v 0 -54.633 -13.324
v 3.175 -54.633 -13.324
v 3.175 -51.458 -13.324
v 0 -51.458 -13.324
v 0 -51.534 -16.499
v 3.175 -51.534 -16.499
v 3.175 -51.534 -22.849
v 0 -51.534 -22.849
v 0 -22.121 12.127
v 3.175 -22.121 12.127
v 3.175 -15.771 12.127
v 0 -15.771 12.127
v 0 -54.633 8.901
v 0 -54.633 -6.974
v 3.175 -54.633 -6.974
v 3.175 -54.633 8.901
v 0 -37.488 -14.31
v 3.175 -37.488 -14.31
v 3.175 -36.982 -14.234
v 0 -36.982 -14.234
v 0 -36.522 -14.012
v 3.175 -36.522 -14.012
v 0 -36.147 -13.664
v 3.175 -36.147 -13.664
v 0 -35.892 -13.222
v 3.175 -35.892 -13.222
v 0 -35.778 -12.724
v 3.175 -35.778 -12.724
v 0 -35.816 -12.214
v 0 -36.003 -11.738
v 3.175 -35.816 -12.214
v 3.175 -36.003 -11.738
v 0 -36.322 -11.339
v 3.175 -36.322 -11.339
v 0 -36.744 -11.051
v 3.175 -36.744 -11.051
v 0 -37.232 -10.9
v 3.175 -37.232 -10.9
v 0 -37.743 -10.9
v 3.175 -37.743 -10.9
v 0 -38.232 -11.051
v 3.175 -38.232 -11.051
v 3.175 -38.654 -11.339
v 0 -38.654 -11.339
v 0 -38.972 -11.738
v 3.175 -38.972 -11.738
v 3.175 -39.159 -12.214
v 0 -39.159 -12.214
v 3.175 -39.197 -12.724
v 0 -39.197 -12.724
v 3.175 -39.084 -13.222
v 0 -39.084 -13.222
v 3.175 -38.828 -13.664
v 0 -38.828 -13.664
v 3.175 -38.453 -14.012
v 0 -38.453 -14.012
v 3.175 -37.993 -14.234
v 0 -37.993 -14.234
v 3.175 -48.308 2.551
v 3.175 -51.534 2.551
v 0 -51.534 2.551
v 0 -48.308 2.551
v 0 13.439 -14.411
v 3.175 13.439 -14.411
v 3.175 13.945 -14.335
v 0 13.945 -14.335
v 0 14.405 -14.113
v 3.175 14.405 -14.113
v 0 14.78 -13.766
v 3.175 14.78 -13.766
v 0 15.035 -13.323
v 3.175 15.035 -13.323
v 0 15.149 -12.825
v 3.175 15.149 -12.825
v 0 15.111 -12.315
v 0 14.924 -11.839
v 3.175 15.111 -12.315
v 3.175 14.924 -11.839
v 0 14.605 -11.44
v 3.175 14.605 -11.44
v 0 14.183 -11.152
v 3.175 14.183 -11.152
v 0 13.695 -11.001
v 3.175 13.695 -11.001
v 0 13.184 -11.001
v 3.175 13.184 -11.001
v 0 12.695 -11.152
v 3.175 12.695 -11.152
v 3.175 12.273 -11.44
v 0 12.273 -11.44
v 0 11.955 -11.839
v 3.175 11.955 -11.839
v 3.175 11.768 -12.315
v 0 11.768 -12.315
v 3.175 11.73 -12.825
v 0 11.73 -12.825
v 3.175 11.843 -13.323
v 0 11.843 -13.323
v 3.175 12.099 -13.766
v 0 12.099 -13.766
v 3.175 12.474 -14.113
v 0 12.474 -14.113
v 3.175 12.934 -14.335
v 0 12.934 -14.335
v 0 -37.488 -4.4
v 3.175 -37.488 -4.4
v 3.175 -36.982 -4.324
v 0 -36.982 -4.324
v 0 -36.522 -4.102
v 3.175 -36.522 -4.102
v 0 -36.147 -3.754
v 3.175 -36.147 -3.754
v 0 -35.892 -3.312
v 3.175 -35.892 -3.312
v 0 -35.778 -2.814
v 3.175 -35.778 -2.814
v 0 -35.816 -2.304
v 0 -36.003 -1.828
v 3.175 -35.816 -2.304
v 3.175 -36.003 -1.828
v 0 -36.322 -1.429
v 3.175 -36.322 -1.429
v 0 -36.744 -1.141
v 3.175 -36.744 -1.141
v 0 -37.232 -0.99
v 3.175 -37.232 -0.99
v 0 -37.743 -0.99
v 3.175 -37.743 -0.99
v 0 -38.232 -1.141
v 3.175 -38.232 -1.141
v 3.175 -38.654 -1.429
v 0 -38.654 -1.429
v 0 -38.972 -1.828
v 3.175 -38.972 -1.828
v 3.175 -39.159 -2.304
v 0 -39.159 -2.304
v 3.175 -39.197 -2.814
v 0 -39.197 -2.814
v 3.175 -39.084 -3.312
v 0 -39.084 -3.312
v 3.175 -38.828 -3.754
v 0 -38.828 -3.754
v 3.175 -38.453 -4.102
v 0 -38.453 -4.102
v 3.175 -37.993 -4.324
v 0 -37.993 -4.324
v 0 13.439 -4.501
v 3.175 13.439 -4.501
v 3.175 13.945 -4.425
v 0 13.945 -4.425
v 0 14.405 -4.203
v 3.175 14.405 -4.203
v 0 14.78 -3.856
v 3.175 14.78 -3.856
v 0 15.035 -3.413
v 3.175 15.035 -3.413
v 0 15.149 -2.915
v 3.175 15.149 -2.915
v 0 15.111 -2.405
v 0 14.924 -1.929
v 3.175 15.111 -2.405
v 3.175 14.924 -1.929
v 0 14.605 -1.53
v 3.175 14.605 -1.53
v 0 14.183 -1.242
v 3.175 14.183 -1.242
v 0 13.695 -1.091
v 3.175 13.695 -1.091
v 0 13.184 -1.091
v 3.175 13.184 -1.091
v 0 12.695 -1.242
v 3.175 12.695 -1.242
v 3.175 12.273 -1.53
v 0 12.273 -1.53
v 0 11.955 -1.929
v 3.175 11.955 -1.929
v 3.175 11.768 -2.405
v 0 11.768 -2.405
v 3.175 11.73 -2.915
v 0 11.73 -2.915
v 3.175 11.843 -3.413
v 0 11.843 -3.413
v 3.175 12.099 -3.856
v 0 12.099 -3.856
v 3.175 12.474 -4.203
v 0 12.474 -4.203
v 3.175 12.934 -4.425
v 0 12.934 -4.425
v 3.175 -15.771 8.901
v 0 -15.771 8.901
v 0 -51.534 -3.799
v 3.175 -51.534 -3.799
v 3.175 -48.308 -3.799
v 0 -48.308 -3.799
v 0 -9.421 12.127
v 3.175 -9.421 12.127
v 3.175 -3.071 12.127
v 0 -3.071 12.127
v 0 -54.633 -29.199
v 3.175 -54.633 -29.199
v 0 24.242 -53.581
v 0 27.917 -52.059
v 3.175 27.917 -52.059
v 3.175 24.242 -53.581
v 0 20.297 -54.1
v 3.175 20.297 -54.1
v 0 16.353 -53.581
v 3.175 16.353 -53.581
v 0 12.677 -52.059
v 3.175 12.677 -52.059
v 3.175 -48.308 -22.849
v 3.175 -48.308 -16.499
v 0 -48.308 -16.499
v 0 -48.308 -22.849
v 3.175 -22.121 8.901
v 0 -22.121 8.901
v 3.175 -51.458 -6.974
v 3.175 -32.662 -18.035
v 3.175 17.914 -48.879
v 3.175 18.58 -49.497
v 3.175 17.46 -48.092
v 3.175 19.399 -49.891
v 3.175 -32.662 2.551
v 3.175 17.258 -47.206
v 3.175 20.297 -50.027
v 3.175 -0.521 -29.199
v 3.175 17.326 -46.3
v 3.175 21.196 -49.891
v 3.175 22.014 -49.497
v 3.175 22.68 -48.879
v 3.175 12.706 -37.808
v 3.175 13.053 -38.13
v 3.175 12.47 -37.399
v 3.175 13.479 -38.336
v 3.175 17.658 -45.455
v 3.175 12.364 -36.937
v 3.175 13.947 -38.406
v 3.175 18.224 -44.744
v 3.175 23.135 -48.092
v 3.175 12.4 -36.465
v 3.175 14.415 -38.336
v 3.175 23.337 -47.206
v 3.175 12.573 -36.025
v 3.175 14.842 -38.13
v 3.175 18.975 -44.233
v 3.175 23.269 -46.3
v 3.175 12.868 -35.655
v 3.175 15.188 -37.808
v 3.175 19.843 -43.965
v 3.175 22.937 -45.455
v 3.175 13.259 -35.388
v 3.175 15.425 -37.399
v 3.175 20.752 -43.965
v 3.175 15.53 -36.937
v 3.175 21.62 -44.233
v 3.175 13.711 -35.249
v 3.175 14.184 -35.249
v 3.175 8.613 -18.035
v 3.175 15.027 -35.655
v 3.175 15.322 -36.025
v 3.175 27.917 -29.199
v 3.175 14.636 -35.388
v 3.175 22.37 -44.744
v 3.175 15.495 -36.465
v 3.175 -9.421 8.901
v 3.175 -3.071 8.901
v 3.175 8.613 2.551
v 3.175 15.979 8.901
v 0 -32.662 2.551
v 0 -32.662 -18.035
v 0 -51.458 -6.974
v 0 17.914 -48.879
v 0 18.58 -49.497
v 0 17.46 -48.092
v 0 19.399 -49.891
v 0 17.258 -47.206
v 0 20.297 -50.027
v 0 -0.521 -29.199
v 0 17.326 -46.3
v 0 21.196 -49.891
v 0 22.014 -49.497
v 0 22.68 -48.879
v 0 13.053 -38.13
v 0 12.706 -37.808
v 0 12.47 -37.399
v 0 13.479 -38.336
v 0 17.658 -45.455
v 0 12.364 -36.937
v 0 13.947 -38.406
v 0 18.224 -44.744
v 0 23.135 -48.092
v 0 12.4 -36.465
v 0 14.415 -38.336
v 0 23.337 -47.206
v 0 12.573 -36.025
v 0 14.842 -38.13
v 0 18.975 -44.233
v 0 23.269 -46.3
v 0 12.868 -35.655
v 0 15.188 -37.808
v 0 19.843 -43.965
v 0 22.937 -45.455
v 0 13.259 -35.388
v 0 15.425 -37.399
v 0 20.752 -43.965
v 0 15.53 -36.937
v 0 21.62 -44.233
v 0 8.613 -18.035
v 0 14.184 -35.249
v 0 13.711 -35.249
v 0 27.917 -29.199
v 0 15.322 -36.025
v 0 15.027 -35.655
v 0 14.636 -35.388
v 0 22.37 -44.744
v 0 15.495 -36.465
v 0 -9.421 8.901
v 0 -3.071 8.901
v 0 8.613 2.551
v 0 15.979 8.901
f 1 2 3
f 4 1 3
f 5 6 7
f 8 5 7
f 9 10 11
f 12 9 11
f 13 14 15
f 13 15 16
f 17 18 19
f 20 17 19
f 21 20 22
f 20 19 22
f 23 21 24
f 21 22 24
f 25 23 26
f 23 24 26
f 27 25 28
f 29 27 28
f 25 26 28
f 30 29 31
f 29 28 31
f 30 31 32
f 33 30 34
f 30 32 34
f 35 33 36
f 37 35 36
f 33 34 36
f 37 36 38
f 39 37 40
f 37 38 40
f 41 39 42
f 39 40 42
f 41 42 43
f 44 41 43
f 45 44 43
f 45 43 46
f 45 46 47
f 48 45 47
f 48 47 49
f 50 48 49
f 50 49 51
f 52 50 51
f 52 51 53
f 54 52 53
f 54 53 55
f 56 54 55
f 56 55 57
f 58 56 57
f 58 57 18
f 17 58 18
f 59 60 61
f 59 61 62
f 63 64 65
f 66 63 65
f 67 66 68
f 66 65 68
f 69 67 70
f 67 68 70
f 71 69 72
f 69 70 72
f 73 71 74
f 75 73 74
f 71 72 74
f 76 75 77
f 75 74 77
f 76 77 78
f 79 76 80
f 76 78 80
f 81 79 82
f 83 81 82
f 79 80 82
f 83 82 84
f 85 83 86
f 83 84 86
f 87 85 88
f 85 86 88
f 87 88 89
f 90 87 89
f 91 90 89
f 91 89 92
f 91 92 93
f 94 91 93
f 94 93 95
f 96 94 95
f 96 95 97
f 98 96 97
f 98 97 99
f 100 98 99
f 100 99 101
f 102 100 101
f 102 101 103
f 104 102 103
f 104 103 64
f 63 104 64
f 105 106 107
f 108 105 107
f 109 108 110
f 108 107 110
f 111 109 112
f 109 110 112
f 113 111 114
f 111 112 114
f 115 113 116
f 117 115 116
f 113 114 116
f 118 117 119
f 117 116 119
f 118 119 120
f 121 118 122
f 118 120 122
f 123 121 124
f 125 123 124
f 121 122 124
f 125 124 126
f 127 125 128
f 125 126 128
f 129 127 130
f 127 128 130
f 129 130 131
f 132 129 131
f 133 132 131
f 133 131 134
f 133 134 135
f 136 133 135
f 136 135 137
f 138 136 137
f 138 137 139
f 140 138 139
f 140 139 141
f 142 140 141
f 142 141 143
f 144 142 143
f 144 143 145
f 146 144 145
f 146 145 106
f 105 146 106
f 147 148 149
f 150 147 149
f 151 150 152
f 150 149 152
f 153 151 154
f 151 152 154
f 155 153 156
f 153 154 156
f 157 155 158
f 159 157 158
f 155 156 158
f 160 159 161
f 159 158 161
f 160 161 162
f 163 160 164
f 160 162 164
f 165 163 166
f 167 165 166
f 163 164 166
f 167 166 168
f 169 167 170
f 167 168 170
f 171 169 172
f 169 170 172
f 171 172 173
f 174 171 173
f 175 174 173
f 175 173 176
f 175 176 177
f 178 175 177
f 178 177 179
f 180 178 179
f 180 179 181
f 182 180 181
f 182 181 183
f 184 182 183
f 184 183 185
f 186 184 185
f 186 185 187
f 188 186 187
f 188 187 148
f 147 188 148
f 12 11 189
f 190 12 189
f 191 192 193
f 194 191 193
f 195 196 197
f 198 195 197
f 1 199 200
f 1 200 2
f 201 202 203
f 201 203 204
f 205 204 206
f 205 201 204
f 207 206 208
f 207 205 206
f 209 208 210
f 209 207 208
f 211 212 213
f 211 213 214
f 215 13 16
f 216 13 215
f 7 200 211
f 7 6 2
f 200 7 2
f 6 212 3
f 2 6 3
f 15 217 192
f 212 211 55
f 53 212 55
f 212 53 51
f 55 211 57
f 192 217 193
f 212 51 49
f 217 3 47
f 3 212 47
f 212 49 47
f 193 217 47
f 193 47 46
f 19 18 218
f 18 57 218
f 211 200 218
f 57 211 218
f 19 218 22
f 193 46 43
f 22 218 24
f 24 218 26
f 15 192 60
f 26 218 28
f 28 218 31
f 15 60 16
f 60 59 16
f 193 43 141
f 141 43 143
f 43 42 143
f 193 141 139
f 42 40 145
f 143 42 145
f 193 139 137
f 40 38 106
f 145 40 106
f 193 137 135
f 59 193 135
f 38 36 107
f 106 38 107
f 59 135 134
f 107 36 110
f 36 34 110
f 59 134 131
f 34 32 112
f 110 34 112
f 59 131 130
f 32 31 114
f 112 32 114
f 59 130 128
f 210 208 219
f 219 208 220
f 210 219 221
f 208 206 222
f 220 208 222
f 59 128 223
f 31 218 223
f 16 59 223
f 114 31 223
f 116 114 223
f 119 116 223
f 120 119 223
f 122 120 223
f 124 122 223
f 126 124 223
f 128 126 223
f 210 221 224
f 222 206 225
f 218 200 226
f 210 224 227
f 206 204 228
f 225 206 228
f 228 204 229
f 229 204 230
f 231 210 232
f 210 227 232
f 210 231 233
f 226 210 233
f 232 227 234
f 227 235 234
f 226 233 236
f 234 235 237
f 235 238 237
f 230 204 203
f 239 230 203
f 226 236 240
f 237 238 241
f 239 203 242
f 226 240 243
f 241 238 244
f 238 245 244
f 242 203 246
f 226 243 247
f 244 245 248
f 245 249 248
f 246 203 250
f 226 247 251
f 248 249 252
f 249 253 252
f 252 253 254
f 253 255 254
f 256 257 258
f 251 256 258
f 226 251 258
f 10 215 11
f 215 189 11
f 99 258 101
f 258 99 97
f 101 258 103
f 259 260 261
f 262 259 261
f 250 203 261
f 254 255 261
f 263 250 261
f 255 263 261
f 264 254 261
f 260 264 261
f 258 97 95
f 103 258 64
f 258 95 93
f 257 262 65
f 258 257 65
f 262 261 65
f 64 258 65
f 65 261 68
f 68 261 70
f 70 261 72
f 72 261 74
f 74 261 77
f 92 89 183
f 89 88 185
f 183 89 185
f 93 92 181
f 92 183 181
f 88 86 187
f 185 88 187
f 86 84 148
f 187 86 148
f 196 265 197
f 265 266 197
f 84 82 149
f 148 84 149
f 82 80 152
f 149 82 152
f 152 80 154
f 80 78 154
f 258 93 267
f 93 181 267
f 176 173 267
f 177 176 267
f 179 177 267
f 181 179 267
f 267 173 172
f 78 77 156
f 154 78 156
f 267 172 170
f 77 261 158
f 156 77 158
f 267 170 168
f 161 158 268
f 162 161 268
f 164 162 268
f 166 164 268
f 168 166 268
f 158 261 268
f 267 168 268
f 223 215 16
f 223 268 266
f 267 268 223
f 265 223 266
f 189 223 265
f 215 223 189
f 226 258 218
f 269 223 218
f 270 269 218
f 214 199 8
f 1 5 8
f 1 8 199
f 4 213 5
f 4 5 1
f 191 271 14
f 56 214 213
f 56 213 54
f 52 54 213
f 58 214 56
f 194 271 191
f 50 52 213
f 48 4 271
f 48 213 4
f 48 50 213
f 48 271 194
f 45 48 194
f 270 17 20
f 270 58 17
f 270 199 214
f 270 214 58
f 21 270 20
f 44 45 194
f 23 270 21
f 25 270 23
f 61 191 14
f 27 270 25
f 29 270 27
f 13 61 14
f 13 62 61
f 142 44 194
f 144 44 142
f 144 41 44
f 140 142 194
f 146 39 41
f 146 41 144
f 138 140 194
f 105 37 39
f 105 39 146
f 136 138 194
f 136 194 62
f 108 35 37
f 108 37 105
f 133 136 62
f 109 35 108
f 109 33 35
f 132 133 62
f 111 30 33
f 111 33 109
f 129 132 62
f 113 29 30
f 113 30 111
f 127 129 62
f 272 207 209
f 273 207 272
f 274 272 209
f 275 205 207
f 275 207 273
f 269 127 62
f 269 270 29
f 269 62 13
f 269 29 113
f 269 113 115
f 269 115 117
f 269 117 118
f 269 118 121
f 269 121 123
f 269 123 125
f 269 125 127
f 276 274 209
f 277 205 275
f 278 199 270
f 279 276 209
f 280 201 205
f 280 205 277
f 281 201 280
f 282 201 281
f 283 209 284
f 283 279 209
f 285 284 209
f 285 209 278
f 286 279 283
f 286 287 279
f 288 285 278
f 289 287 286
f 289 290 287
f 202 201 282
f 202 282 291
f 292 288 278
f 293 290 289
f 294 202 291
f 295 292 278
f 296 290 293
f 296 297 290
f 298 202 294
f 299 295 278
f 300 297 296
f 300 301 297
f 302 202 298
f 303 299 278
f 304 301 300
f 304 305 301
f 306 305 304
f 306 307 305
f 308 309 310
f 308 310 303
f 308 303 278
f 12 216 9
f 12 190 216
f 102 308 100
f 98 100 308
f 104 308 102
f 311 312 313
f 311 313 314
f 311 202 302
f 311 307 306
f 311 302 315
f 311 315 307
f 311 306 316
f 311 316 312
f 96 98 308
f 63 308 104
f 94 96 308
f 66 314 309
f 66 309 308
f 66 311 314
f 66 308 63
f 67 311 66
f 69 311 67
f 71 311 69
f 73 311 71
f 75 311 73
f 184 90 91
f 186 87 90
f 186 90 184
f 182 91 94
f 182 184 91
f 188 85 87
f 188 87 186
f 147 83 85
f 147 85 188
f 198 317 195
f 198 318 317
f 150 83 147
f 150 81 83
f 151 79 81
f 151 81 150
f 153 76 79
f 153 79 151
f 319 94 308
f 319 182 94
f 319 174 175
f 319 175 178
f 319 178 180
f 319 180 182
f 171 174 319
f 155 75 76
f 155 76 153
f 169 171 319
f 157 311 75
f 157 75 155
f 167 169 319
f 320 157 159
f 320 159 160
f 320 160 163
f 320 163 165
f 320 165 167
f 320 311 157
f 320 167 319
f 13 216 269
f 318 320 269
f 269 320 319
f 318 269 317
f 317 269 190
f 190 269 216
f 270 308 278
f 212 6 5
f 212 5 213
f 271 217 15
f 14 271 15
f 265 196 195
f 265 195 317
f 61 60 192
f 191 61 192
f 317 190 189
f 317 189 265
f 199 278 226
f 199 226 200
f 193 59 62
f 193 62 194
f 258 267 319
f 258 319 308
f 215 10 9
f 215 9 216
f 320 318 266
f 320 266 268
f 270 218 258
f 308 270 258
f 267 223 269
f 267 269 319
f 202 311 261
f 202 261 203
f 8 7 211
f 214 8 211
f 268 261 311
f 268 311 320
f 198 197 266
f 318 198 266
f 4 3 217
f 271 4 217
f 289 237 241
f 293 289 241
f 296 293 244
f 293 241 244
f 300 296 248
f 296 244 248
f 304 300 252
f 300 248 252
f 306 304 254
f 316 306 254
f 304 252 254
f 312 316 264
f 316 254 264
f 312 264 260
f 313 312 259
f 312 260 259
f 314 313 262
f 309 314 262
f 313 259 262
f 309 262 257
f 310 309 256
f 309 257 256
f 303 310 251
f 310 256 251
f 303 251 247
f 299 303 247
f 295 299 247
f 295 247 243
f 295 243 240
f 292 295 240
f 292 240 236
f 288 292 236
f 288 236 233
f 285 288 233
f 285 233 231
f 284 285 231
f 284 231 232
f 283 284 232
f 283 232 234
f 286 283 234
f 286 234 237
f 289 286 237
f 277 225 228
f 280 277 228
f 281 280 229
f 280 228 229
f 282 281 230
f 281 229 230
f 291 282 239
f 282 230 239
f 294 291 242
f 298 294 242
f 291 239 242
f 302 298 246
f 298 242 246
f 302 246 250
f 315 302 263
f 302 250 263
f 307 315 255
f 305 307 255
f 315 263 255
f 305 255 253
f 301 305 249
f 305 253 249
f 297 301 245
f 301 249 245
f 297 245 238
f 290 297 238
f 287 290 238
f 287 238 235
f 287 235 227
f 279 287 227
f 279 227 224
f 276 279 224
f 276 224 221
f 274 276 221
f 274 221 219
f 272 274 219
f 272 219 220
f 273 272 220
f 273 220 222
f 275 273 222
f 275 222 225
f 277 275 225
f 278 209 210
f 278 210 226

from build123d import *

# Parameters (mm, degrees)
BOSS_EXTRUDE1_DEPTH                 = 3.175
SKETCH2_R                           = 1.7145
SKETCH2_W                           = 20.586
SKETCH2_H                           = 41.275
CUT_FOR_MOTOR_DEPTH                 = 4.175
SKETCH3_R                           = 3.048
CUT_FOR_AXLE_DEPTH                  = 4.175
SKETCH4_W                           = 6.35
SKETCH4_H                           = 3.2258
CUT_FOR_TABS_DEPTH                  = 4.175
CUT_EXTRUDE6_DEPTH                  = 4.175
SKETCH9_W                           = 3.2258
SKETCH9_H                           = 6.35
TABS_FOR_BACK_PLATE_DEPTH           = 3.175
SKETCH10_R                          = 1.5875
CUT_FOR_BASIC_TILT_LOCK_SCREW_DEPTH = 4.175


with BuildPart() as part:
    # Sketch1 → Boss-Extrude1 (new body)
    with BuildSketch(Plane(origin=(0, 0, 0), x_dir=(0, 0, -1), z_dir=(1, 0, 0))):
        with BuildLine():
            Line((-8.901335672, 27.917328656), (29.198664328, 27.917328656))
            Line((29.198664328, 27.917328656), (52.058664328, 27.917328656))
            ThreePointArc((52.058664328, 27.917328656), (54.100437174, 20.297328656), (52.058664328, 12.677328656))
            Line((52.058664328, 12.677328656), (29.198664328, -0.520898498))
            Line((29.198664328, -0.520898498), (29.198664328, -54.632671344))
            Line((29.198664328, -54.632671344), (-8.901335672, -54.632671344))
            Line((-8.901335672, -54.632671344), (-8.901335672, 27.917328656))
        make_face()
    extrude(amount=BOSS_EXTRUDE1_DEPTH)

    # Sketch2 → cut for motor (cut, through all)
    with BuildSketch(Plane(origin=(3.175, 0, 0), x_dir=(0, 0, -1), z_dir=(1, 0, 0))):
        with Locations((12.696664328, 13.439328656)):
            Circle(SKETCH2_R)
        with Locations((2.786664328, 13.439328656)):
            Circle(SKETCH2_R)
        with Locations((12.595457687, -37.487671344)):
            Circle(SKETCH2_R)
        with Locations((2.685457687, -37.487671344)):
            Circle(SKETCH2_R)
        with Locations((7.741664328, -12.024171344)):
            Rectangle(SKETCH2_W, SKETCH2_H)
    extrude(amount=-CUT_FOR_MOTOR_DEPTH, mode=Mode.SUBTRACT)

    # Sketch3 → cut for axle (cut, through all)
    with BuildSketch(Plane(origin=(3.175, 0, 0), x_dir=(0, 0, -1), z_dir=(1, 0, 0))):
        with Locations((46.978664328, 20.297328656)):
            Circle(SKETCH3_R)
    extrude(amount=-CUT_FOR_AXLE_DEPTH, mode=Mode.SUBTRACT)

    # Sketch4 → cut for tabs (cut, through all)
    with BuildSketch(Plane(origin=(3.175, 0, 0), x_dir=(0, 0, -1), z_dir=(1, 0, 0))):
        with Locations((0.623664328, -49.920971344)):
            Rectangle(SKETCH4_W, SKETCH4_H)
        with Locations((19.673664328, -49.920971344)):
            Rectangle(SKETCH4_W, SKETCH4_H)
        Polygon((10.148664328, -54.632671344), (13.323664328, -54.632671344), (13.323664328, -51.457671344), (6.973664328, -51.457671344), (6.973664328, -54.632671344), align=None)
    extrude(amount=-CUT_FOR_TABS_DEPTH, mode=Mode.SUBTRACT)

    # Sketch8 → Cut-Extrude6 (cut, through all)
    with BuildSketch(Plane(origin=(3.175, 0, 0), x_dir=(0, 0, -1), z_dir=(1, 0, 0))):
        Polygon((29.198664328, 27.917328656), (-8.901335672, 15.979328656), (-8.901335672, 27.917328656), align=None)
    extrude(amount=-CUT_EXTRUDE6_DEPTH, mode=Mode.SUBTRACT)

    # Sketch9 → tabs for back plate (add)
    with BuildSketch(Plane(origin=(3.175, 0, 0), x_dir=(0, 0, -1), z_dir=(1, 0, 0))):
        with Locations((-10.514235672, -6.245671344)):
            Rectangle(SKETCH9_W, SKETCH9_H)
        with Locations((-10.514235672, -18.945671344)):
            Rectangle(SKETCH9_W, SKETCH9_H)
    extrude(amount=-TABS_FOR_BACK_PLATE_DEPTH)

    # Sketch10 → cut for basic tilt lock screw (cut, through all)
    with BuildSketch(Plane(origin=(3.175, 0, 0), x_dir=(0, 0, -1), z_dir=(1, 0, 0))):
        with Locations((36.818664328, 13.947328656)):
            Circle(SKETCH10_R)
    extrude(amount=-CUT_FOR_BASIC_TILT_LOCK_SCREW_DEPTH, mode=Mode.SUBTRACT)


solid = part.part
